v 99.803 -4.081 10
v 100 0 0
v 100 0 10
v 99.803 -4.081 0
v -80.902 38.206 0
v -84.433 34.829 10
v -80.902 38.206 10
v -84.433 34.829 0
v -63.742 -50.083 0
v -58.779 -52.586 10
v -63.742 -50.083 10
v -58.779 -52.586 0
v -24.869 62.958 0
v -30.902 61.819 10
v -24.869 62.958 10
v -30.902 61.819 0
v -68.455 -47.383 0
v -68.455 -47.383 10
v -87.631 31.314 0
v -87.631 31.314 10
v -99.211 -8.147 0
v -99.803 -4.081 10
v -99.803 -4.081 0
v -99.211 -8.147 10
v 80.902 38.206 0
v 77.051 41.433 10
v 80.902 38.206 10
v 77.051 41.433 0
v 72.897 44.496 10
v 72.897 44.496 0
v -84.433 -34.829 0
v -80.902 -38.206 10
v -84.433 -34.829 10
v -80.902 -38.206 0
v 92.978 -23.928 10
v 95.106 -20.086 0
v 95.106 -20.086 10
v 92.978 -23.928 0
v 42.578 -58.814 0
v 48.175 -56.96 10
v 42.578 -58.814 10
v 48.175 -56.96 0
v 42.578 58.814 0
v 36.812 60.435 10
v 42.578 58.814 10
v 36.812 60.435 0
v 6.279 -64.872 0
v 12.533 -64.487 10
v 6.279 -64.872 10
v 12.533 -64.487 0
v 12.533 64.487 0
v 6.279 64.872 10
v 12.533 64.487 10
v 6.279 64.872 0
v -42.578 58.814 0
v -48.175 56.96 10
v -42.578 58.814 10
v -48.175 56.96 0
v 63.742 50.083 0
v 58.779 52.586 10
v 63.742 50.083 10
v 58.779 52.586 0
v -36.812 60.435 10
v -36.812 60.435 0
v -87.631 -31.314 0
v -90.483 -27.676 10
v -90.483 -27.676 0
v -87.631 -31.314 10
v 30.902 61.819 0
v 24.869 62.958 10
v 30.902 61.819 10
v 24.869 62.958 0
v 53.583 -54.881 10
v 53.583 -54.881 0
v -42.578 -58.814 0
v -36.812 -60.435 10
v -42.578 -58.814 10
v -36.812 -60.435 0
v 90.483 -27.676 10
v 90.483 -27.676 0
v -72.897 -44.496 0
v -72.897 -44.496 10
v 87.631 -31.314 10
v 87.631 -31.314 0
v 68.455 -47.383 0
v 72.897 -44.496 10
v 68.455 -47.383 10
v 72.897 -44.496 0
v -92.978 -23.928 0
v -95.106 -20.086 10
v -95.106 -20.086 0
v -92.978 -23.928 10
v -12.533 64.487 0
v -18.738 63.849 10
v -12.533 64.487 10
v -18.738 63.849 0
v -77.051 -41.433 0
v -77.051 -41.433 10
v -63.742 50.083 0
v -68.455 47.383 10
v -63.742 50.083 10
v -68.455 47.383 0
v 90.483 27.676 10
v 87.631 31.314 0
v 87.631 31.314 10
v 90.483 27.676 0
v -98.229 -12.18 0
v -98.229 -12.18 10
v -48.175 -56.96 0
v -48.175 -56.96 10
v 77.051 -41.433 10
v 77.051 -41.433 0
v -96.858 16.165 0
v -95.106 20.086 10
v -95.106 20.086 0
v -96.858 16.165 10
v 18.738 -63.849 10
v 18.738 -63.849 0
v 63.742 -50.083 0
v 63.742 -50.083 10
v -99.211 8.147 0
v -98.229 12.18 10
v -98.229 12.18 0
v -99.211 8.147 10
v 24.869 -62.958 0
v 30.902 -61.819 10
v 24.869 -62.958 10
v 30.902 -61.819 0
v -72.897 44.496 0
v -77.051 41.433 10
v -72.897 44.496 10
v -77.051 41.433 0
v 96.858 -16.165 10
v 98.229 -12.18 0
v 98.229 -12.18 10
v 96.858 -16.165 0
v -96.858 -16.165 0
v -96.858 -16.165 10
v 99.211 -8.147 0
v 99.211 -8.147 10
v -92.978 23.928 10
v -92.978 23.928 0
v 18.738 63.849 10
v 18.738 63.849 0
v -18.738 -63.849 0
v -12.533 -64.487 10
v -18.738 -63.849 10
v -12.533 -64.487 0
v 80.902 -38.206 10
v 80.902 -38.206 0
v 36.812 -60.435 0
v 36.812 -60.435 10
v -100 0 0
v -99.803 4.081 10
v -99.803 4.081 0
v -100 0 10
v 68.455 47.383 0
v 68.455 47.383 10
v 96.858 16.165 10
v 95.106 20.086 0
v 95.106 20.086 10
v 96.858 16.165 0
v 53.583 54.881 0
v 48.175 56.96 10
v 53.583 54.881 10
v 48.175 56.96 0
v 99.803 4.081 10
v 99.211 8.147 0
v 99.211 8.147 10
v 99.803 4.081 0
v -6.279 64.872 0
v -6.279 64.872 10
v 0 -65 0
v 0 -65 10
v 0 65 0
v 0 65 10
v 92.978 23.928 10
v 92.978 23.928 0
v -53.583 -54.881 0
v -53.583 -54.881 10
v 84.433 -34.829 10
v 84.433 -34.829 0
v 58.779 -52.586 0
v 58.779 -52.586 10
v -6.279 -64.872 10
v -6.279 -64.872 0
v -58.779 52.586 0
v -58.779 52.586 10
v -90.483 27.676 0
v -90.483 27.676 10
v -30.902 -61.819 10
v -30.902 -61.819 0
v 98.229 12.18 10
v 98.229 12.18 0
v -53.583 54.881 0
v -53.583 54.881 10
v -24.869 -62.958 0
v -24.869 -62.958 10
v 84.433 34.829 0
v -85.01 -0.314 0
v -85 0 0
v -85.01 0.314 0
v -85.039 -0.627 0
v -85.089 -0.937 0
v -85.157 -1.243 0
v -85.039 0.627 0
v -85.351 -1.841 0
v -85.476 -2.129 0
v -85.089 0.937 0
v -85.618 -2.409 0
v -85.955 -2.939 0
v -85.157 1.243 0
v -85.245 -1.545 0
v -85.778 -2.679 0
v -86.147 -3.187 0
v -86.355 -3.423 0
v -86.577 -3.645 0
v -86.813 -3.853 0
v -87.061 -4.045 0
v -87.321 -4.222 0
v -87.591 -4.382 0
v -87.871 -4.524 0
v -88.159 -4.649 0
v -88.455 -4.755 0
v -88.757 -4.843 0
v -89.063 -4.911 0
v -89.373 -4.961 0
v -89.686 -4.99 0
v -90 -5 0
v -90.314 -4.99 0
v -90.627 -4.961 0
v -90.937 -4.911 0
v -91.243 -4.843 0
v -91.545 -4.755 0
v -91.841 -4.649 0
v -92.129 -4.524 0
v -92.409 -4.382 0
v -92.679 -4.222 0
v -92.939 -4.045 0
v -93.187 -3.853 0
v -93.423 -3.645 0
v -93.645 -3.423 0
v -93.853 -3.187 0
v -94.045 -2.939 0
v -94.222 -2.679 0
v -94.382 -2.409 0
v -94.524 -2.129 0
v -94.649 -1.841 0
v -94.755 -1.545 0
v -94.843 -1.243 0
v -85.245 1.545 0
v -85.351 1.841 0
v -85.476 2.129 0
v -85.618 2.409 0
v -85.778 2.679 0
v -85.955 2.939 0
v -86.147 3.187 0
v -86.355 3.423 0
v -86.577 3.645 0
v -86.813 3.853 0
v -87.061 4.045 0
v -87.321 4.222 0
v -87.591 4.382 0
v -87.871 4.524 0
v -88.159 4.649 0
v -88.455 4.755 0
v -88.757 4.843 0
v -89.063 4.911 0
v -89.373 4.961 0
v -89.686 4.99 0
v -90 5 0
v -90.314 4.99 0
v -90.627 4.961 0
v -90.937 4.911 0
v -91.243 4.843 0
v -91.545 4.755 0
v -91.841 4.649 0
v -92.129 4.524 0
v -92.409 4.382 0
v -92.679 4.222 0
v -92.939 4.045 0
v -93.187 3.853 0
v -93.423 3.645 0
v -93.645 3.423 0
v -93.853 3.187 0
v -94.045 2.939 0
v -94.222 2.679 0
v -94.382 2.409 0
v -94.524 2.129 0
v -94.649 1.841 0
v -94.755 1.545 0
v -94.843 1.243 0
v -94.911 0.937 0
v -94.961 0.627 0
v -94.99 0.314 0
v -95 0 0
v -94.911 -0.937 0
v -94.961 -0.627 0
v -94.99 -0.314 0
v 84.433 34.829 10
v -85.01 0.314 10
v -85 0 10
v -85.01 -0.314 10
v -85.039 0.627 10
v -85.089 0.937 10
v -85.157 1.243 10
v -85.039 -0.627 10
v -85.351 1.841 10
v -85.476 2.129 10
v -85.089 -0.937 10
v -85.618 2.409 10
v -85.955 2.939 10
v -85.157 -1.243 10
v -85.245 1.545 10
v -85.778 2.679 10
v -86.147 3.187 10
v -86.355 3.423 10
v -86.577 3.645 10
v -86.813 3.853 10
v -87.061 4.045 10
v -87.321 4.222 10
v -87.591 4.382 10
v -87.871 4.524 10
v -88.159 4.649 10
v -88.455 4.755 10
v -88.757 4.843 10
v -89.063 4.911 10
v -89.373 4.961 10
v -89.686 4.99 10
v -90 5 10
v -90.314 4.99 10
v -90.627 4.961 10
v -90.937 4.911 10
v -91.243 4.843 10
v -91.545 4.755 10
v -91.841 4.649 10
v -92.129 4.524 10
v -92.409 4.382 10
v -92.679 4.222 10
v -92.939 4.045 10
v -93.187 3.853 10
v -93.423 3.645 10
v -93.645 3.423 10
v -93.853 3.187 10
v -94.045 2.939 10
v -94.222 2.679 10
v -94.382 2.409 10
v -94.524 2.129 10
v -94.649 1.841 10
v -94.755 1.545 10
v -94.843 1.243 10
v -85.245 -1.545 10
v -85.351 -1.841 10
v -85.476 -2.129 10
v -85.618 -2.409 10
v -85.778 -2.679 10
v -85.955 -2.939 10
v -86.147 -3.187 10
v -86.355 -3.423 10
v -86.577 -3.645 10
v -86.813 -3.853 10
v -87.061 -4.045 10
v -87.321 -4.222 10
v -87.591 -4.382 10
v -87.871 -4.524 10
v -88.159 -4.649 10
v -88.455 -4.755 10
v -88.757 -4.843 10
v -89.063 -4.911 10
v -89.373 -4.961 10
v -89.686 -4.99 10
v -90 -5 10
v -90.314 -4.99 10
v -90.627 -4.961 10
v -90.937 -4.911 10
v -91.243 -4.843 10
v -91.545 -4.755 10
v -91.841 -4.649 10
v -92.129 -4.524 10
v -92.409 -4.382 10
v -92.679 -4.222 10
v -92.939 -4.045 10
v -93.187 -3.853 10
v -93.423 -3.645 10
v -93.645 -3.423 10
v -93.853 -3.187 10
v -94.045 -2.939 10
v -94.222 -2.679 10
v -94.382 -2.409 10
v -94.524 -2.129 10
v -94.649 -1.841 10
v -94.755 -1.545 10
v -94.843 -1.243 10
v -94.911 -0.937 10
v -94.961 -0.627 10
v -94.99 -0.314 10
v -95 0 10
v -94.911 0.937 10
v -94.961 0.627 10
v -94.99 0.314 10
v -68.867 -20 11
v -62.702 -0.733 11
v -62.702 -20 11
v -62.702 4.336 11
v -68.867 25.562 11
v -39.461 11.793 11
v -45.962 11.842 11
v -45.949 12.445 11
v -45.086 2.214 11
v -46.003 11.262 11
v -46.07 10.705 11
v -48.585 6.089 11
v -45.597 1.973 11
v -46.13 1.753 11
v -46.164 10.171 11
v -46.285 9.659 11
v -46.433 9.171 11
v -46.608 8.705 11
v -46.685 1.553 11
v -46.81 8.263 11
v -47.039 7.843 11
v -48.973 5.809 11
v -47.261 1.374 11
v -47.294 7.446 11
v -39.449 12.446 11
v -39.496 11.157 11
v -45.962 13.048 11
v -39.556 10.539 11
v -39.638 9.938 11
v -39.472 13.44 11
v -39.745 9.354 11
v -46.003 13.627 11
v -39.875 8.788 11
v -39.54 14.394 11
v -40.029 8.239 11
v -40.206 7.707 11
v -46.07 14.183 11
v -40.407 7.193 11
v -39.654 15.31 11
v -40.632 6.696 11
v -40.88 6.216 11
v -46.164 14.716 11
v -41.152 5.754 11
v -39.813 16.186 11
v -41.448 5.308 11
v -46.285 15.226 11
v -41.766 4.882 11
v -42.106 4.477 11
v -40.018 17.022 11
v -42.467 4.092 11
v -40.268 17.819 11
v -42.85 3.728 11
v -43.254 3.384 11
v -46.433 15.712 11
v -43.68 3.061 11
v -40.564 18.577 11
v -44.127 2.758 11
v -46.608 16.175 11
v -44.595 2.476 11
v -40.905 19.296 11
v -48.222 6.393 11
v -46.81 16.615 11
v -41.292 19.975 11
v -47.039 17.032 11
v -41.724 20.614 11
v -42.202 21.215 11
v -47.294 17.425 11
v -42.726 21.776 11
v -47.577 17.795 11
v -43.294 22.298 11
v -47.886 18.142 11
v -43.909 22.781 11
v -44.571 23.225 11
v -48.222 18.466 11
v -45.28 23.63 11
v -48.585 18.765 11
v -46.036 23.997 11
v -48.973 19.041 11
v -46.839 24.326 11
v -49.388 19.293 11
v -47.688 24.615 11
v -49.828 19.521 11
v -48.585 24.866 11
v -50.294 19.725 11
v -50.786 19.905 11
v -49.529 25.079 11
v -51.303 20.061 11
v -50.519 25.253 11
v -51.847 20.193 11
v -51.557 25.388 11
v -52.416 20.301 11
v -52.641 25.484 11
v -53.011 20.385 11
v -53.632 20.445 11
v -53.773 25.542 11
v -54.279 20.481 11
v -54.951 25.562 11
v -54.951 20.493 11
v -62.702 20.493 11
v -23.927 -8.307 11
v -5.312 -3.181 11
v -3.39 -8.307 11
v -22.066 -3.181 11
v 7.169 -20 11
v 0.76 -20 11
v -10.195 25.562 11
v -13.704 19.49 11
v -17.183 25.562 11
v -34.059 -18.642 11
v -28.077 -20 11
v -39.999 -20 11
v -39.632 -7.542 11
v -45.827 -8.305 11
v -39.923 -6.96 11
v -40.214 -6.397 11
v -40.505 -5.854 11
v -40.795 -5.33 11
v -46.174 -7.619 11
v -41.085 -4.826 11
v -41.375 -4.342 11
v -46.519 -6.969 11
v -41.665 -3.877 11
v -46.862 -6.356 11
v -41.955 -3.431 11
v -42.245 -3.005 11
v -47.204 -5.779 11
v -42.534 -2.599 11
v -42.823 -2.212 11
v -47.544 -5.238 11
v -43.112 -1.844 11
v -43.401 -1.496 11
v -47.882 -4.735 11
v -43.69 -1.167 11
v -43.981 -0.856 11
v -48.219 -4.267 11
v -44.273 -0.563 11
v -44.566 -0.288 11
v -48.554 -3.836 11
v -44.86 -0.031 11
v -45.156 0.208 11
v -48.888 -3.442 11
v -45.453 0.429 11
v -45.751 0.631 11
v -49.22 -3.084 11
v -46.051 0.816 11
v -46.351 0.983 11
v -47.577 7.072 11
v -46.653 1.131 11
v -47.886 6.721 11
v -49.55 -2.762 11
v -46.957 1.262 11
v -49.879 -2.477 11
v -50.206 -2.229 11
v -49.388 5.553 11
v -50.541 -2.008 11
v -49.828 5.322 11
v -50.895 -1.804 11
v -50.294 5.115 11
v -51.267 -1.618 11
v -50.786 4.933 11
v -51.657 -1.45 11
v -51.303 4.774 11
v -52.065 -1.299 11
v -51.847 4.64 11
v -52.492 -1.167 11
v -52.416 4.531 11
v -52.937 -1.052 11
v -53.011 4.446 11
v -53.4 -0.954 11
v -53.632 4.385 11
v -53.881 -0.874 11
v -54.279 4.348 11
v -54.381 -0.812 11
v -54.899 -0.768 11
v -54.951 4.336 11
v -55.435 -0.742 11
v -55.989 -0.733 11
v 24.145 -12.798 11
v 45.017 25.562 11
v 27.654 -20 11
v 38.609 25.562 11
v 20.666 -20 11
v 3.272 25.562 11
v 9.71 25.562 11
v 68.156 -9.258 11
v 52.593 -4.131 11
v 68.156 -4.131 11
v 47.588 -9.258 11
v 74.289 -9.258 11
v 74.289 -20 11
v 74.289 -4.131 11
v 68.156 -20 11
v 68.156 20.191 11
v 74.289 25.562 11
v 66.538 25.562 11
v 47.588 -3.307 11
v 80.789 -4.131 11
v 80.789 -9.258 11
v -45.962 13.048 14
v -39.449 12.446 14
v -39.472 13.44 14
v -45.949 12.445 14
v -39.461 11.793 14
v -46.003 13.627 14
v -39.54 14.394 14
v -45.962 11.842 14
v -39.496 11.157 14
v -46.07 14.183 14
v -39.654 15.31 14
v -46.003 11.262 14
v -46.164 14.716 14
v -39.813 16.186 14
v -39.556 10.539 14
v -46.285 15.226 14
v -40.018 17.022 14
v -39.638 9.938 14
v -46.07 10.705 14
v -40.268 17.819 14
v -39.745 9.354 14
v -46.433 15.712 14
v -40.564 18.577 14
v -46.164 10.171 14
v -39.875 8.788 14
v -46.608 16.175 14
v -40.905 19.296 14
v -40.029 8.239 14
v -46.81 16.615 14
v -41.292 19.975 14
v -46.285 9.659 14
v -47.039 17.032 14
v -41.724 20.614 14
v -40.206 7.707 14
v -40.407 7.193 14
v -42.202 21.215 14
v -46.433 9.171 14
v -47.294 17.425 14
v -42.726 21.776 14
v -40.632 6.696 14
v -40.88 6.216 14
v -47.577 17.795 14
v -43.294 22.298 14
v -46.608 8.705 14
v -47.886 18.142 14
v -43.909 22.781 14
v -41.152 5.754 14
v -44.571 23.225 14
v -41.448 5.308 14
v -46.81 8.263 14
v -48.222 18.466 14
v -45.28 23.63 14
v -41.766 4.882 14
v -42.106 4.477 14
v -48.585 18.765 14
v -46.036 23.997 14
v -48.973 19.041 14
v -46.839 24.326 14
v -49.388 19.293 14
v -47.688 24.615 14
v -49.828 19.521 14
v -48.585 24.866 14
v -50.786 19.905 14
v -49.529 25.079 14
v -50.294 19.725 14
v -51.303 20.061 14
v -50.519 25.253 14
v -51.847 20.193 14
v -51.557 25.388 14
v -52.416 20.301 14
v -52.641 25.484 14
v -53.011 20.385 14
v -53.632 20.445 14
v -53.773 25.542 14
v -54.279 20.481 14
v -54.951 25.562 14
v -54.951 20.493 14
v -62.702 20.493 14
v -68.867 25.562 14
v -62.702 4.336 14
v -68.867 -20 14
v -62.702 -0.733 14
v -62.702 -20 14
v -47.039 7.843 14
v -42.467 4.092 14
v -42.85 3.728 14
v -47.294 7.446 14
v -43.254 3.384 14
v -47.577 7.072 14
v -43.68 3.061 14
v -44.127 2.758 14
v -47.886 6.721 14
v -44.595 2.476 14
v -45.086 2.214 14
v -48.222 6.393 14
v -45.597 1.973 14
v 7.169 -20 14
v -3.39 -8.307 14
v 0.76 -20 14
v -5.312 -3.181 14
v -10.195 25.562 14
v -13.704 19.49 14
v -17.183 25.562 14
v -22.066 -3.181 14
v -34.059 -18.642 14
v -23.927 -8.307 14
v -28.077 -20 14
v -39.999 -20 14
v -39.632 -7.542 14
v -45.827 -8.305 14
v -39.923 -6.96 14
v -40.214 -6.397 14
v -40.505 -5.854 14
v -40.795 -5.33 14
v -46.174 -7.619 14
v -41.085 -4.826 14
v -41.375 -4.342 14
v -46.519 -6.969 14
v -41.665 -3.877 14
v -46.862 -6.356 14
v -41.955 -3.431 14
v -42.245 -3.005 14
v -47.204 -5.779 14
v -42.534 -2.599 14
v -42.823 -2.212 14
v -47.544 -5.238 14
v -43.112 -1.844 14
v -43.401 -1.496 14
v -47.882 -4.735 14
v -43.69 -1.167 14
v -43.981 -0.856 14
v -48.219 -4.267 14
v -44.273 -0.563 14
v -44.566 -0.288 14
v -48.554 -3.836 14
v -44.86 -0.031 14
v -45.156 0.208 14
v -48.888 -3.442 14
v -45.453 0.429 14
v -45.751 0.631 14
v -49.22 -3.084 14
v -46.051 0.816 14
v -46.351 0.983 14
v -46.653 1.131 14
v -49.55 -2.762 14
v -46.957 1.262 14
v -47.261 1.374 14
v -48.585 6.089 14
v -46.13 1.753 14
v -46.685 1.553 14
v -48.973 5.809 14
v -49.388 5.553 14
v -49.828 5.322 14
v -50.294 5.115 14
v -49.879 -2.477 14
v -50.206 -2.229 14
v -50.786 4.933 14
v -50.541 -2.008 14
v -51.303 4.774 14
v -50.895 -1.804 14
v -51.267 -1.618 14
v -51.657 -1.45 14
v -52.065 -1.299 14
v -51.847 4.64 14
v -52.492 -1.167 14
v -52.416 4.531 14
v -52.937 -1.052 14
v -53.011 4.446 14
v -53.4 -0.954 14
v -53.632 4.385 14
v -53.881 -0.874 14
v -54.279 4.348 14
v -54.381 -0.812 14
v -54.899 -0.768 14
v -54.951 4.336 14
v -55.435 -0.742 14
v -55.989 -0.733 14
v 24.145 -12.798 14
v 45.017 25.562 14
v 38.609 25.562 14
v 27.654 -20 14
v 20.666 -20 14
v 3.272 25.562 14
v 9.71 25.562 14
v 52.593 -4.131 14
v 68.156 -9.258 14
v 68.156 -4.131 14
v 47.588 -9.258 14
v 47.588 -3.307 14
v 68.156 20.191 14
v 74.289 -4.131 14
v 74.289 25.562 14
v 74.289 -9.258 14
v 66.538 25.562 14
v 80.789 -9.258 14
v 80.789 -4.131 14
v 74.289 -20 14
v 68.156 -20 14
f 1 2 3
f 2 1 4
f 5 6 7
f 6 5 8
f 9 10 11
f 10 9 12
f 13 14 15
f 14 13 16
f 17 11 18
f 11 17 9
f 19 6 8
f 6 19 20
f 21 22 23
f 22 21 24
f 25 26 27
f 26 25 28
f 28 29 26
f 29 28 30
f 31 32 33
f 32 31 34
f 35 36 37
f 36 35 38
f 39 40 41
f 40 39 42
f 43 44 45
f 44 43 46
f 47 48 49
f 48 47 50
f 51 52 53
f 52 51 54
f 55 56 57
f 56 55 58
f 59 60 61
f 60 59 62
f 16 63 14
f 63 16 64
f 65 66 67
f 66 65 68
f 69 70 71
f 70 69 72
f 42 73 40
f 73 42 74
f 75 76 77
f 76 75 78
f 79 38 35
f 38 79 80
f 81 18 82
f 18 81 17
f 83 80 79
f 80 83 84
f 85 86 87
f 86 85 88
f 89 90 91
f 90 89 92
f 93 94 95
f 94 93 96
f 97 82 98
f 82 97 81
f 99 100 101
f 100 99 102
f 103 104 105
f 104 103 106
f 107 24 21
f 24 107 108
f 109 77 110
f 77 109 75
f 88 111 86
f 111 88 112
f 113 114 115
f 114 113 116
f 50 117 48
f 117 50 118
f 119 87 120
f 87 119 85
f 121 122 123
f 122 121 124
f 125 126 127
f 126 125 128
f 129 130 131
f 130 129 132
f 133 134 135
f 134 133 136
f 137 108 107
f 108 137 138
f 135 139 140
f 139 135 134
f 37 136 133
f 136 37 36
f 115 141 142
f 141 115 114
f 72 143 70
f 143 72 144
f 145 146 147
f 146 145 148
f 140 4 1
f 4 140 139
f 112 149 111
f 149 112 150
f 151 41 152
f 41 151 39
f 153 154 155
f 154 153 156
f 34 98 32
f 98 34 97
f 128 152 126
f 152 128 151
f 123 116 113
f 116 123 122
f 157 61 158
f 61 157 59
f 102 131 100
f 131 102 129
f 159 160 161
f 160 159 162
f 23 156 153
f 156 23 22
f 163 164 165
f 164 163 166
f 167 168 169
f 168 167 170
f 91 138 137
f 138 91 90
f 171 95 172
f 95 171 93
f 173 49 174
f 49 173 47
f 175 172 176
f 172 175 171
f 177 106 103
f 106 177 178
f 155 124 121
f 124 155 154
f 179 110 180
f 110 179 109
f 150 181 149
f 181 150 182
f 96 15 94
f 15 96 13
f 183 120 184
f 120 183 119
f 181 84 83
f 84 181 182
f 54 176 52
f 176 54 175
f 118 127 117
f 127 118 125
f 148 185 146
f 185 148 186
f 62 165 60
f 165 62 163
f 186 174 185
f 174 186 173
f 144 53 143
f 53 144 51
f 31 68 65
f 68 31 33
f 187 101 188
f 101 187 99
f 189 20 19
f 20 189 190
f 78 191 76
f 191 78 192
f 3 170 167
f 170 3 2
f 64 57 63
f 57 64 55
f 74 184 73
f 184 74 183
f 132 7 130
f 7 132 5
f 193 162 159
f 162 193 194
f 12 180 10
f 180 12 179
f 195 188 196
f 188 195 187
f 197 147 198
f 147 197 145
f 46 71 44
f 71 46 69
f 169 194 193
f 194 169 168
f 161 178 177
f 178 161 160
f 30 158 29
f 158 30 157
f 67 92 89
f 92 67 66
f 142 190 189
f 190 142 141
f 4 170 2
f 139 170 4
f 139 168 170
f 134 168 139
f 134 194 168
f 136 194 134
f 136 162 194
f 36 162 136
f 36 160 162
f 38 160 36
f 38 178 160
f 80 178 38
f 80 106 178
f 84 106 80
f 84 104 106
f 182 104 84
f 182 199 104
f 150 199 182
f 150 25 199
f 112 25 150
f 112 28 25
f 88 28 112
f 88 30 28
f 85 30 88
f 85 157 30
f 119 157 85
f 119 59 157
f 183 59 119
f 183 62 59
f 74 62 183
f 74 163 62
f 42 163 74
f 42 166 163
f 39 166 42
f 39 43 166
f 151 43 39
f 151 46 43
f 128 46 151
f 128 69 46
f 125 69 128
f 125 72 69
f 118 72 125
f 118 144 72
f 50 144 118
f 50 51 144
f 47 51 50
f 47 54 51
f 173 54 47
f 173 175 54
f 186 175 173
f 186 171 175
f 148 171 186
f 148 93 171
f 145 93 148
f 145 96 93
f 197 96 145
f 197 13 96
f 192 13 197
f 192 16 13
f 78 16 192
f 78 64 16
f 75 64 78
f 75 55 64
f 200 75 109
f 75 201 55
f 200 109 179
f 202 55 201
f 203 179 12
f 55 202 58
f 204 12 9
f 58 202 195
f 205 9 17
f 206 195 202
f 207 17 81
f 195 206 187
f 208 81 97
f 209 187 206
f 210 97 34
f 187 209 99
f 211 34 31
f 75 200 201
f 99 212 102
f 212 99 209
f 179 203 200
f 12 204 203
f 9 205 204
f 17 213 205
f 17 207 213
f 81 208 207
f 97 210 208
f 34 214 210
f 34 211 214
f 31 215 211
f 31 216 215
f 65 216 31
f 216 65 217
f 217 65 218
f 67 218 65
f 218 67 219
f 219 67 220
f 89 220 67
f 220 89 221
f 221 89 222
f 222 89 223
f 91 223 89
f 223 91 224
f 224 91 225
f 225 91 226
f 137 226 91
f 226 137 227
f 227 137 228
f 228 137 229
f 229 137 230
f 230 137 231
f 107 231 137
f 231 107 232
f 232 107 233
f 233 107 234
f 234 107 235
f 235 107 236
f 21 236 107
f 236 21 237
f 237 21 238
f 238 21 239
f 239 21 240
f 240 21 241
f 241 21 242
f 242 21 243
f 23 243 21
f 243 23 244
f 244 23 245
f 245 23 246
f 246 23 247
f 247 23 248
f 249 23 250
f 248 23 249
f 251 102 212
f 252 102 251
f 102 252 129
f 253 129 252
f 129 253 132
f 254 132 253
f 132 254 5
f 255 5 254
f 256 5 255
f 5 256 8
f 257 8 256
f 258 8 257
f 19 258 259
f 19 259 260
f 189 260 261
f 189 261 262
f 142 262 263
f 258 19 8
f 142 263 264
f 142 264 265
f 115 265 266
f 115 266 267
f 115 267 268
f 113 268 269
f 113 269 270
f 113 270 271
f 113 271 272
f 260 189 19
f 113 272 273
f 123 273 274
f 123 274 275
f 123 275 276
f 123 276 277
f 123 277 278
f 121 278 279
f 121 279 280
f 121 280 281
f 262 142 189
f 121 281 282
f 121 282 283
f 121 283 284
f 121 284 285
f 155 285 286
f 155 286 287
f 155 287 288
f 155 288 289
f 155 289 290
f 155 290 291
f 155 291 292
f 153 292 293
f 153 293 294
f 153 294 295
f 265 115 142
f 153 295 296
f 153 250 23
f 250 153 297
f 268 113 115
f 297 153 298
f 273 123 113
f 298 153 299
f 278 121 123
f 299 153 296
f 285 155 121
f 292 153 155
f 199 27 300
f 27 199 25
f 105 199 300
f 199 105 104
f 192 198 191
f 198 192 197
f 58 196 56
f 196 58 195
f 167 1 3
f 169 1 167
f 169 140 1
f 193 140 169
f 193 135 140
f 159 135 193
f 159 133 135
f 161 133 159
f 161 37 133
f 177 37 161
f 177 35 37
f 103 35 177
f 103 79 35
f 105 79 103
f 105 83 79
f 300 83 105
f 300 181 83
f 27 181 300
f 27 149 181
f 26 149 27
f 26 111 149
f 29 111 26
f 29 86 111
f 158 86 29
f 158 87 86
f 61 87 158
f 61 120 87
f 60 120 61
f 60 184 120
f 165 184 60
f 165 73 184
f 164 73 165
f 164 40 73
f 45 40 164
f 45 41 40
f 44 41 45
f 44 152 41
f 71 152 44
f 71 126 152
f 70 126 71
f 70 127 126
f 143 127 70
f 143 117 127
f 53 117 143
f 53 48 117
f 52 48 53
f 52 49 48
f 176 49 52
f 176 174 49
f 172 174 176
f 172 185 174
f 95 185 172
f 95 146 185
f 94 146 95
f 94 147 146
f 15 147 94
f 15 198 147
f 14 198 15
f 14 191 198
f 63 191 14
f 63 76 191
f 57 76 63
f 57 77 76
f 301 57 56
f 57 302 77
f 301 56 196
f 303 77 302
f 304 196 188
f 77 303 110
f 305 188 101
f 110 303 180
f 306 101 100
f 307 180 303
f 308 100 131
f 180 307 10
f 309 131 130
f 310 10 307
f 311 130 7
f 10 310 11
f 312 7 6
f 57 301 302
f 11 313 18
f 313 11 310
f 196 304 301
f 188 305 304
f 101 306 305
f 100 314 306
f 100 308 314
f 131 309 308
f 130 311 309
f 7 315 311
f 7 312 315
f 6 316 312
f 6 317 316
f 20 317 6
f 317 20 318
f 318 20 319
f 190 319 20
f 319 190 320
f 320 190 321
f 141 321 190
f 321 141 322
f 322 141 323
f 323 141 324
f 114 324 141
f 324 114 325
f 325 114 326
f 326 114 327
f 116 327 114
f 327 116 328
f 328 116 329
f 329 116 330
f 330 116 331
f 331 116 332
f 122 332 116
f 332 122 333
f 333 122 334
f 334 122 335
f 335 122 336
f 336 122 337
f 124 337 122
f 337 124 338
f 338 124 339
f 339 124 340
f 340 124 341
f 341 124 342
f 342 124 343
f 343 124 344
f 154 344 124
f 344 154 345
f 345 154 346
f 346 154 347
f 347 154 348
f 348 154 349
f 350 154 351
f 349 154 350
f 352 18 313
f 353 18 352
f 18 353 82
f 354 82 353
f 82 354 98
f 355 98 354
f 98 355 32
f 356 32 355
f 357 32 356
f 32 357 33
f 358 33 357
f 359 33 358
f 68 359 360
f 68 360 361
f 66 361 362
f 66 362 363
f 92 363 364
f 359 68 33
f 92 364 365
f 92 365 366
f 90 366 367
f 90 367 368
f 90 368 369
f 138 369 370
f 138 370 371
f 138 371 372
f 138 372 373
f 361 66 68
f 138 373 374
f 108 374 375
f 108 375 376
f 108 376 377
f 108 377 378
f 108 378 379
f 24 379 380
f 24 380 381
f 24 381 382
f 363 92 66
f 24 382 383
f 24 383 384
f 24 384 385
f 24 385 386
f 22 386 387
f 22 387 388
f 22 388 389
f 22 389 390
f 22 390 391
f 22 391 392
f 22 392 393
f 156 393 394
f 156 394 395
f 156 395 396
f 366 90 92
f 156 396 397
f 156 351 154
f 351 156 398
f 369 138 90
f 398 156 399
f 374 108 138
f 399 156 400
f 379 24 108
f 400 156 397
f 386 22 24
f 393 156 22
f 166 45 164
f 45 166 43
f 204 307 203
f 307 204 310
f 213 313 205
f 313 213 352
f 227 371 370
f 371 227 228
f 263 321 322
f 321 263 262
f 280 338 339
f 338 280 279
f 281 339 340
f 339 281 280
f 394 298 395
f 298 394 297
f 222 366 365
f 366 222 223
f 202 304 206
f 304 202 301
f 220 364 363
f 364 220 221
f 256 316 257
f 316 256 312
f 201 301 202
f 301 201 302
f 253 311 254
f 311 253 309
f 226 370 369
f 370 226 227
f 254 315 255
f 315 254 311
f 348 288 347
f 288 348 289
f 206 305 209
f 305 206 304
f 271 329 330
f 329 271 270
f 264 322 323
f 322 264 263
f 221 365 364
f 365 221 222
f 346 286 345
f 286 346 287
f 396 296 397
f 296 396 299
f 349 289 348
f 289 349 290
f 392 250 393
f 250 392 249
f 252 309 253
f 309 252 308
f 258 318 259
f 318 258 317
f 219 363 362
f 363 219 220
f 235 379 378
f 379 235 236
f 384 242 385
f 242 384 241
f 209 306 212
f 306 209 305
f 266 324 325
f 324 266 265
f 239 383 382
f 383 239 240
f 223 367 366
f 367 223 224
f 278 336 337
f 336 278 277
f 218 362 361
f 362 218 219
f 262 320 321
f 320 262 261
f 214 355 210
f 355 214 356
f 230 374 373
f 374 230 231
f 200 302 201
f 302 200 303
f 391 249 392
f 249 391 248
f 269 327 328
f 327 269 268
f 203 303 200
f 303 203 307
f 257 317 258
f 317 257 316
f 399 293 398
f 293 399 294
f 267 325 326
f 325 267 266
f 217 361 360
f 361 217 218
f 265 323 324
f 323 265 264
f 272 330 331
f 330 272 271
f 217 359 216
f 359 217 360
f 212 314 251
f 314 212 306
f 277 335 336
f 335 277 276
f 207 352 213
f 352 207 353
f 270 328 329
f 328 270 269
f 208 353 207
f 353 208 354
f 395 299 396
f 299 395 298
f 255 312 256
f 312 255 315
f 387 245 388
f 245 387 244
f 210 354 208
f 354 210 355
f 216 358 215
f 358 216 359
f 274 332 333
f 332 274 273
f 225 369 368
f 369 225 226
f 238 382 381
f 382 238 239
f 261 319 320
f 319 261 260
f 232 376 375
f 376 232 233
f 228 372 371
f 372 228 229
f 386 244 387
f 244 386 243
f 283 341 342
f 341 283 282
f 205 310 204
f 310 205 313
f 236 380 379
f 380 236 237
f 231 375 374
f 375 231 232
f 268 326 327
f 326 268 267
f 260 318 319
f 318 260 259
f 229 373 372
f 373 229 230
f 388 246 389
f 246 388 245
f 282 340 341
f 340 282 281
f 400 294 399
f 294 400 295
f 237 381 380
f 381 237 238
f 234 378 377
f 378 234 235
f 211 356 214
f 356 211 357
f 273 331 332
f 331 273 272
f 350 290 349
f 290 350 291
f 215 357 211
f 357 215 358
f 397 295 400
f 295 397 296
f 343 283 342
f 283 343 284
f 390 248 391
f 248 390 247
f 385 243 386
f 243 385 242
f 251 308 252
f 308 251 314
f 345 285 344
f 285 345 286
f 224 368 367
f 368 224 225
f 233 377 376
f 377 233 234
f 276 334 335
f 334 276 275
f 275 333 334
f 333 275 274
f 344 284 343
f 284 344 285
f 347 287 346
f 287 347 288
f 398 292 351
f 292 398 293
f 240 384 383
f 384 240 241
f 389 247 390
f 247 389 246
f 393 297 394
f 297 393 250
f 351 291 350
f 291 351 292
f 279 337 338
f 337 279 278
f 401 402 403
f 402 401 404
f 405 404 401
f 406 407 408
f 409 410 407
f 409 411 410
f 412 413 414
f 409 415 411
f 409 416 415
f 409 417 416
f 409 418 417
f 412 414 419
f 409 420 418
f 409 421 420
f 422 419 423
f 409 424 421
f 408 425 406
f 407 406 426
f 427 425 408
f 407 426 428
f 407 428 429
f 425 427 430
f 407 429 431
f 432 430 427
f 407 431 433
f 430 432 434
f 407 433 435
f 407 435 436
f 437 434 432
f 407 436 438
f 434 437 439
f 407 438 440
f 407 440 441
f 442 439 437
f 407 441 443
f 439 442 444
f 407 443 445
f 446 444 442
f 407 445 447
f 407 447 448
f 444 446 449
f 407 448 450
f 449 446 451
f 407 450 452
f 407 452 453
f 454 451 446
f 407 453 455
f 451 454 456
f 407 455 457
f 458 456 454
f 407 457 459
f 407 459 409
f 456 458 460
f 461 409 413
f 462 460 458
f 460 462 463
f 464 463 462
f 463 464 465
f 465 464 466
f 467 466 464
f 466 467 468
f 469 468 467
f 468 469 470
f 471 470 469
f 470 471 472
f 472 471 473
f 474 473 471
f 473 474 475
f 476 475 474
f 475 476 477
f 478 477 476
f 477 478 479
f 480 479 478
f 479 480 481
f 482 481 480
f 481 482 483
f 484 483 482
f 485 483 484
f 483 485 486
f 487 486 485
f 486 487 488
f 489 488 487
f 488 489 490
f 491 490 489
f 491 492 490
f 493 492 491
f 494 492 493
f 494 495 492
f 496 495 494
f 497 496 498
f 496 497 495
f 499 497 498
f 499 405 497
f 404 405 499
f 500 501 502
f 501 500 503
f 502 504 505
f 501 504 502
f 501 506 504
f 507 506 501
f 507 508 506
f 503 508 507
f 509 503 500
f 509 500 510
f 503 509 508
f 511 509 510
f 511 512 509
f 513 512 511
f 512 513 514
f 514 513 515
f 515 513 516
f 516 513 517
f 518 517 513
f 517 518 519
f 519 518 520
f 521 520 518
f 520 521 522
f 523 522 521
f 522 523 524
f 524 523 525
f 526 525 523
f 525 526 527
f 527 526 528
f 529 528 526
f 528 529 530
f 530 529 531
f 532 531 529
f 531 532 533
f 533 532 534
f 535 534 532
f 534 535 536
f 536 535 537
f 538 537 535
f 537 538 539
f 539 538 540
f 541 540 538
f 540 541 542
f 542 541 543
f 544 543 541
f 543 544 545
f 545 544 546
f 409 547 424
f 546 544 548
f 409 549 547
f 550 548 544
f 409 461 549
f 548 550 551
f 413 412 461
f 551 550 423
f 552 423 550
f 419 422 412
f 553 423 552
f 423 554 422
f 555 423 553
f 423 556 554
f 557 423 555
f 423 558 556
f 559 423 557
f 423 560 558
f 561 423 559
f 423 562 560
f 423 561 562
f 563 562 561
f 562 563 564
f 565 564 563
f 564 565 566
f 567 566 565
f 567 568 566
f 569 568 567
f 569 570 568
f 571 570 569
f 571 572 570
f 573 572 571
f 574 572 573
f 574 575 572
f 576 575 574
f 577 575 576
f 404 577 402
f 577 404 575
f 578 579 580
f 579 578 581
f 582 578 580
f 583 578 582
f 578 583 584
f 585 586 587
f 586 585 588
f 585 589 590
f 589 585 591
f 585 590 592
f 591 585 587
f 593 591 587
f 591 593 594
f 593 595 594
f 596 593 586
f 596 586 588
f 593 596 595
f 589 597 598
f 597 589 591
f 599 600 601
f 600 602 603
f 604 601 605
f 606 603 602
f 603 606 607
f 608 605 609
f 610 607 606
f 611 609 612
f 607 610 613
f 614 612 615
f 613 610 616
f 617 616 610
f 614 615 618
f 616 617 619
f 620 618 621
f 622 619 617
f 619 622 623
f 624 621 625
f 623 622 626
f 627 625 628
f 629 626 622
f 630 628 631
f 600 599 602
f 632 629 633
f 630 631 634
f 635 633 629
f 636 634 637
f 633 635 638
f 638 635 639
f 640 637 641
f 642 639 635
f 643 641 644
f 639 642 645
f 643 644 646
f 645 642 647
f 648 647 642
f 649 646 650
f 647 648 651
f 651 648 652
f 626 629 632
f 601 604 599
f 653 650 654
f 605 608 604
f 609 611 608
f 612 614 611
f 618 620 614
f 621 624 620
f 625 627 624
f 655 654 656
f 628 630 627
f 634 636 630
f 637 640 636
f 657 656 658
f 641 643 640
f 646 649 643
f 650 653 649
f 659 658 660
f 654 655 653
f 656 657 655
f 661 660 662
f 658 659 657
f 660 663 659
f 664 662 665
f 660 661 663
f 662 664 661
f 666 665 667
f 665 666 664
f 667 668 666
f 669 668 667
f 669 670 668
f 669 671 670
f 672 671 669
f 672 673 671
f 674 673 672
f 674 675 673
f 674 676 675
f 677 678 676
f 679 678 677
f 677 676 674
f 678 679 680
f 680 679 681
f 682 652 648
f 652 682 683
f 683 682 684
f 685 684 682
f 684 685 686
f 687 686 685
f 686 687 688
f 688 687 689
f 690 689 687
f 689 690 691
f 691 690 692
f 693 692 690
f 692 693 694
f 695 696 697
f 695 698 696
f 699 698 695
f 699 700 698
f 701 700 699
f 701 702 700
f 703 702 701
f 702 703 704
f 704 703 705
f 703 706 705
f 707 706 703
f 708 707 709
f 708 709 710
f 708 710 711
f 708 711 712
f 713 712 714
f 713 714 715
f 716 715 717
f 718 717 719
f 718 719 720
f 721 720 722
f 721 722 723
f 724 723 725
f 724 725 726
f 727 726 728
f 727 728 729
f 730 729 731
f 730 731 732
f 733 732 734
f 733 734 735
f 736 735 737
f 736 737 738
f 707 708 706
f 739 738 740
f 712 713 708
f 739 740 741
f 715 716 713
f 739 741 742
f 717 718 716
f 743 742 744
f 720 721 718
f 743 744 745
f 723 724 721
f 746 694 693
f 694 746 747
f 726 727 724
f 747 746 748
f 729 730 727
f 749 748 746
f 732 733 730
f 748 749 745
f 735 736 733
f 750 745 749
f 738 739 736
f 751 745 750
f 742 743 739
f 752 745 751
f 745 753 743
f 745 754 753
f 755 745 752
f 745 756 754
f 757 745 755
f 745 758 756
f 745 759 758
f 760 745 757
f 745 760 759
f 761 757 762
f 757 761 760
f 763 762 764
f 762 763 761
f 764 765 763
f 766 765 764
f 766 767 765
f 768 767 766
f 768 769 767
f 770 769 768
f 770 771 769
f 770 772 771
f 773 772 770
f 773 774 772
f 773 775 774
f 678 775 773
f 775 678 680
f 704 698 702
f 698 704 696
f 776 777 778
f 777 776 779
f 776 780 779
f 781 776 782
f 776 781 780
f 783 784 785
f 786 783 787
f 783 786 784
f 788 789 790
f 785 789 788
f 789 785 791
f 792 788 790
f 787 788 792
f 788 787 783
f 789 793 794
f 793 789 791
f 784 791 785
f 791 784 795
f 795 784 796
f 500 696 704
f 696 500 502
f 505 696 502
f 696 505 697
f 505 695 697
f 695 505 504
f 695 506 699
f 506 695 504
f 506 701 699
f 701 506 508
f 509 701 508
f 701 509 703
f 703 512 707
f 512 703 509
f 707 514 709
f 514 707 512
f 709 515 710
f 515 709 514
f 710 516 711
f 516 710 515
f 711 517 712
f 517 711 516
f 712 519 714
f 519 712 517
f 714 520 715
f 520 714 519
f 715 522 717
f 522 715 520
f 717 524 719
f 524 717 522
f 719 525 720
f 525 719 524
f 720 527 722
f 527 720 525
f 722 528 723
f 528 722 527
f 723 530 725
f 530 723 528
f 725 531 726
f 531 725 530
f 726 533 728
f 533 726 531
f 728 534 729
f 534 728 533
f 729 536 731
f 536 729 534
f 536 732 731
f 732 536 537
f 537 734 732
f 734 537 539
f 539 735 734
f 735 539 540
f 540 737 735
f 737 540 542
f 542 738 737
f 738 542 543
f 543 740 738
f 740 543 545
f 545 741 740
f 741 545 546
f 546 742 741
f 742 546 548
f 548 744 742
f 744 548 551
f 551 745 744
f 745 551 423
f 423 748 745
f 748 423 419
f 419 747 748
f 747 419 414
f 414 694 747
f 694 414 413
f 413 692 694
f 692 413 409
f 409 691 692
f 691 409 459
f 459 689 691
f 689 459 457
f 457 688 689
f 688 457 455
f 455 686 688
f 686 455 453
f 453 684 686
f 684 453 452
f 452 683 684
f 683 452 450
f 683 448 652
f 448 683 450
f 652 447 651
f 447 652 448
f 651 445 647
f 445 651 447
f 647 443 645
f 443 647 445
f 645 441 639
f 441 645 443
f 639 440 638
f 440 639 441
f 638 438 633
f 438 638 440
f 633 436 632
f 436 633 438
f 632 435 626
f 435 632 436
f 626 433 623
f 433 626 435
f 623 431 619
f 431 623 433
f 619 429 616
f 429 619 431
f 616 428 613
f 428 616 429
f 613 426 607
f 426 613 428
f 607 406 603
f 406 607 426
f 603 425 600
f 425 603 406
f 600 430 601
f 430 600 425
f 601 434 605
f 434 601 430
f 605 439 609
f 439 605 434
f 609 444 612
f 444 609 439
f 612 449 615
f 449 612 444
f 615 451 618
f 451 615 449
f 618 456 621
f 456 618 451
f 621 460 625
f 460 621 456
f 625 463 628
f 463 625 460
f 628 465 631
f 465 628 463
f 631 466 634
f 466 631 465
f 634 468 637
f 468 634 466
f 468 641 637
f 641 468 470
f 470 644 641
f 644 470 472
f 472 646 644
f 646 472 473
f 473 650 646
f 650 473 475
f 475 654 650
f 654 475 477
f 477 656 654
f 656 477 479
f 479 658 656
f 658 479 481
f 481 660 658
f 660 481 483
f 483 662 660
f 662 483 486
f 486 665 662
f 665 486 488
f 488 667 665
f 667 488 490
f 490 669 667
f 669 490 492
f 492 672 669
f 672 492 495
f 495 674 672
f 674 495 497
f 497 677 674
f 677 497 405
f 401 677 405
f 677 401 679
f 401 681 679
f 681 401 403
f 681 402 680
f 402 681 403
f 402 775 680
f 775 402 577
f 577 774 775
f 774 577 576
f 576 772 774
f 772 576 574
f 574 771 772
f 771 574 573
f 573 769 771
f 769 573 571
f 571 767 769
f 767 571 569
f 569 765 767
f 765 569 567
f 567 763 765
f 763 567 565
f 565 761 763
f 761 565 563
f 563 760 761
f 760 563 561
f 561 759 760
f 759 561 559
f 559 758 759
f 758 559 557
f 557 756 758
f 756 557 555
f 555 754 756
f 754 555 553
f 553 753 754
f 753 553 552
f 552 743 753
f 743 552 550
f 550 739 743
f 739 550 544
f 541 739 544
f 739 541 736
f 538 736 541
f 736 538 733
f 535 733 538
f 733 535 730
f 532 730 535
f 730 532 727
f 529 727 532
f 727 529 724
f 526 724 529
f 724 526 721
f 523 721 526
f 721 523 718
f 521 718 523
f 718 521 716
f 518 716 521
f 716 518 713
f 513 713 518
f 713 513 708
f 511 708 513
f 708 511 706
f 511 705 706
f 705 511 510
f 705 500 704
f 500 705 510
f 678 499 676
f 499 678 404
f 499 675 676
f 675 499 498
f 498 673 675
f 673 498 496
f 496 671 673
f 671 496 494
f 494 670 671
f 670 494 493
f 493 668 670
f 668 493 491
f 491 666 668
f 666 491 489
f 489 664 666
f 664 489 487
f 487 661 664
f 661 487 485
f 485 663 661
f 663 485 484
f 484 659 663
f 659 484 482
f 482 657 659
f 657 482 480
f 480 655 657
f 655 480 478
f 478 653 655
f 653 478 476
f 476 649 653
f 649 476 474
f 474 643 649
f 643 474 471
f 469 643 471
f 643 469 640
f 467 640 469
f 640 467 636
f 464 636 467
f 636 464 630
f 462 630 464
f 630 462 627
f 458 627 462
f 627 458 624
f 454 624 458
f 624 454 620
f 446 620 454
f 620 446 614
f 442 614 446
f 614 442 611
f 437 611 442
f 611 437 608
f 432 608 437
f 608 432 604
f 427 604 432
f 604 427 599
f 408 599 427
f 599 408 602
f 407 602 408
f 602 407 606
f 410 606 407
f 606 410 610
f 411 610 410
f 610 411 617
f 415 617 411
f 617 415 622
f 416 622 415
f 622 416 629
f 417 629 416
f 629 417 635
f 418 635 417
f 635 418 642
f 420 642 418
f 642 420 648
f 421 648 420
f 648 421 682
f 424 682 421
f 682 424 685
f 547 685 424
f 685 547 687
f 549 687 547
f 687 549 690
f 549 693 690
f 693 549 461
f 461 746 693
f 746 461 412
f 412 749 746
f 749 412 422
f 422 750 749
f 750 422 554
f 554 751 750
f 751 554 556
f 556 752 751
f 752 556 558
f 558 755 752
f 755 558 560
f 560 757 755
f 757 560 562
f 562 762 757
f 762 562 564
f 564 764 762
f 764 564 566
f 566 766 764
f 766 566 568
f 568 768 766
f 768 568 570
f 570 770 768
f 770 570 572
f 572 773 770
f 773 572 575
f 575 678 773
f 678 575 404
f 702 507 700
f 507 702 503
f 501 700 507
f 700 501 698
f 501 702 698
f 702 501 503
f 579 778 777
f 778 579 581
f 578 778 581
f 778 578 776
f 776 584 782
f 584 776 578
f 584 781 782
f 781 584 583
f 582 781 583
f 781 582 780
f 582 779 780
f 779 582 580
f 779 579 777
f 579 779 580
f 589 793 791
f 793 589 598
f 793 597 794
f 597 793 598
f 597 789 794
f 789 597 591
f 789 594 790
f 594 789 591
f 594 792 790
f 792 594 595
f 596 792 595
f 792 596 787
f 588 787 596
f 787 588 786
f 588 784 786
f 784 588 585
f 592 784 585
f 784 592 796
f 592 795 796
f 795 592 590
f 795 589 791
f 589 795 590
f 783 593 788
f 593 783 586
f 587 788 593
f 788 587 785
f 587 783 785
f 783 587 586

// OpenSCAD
$fn = 100;
difference() {
// The base
linear_extrude(10) {
resize([200, 130])
circle(r = 100, $fn = 100);
}

// The key hole
translate([-90, 0, -5])
cylinder(20, 5, 5);
}

// The text 
translate([-75, -20, 11])
linear_extrude(3) {
text("RAV4", size=45 ,font="URW Gothic:style=Book");
}
